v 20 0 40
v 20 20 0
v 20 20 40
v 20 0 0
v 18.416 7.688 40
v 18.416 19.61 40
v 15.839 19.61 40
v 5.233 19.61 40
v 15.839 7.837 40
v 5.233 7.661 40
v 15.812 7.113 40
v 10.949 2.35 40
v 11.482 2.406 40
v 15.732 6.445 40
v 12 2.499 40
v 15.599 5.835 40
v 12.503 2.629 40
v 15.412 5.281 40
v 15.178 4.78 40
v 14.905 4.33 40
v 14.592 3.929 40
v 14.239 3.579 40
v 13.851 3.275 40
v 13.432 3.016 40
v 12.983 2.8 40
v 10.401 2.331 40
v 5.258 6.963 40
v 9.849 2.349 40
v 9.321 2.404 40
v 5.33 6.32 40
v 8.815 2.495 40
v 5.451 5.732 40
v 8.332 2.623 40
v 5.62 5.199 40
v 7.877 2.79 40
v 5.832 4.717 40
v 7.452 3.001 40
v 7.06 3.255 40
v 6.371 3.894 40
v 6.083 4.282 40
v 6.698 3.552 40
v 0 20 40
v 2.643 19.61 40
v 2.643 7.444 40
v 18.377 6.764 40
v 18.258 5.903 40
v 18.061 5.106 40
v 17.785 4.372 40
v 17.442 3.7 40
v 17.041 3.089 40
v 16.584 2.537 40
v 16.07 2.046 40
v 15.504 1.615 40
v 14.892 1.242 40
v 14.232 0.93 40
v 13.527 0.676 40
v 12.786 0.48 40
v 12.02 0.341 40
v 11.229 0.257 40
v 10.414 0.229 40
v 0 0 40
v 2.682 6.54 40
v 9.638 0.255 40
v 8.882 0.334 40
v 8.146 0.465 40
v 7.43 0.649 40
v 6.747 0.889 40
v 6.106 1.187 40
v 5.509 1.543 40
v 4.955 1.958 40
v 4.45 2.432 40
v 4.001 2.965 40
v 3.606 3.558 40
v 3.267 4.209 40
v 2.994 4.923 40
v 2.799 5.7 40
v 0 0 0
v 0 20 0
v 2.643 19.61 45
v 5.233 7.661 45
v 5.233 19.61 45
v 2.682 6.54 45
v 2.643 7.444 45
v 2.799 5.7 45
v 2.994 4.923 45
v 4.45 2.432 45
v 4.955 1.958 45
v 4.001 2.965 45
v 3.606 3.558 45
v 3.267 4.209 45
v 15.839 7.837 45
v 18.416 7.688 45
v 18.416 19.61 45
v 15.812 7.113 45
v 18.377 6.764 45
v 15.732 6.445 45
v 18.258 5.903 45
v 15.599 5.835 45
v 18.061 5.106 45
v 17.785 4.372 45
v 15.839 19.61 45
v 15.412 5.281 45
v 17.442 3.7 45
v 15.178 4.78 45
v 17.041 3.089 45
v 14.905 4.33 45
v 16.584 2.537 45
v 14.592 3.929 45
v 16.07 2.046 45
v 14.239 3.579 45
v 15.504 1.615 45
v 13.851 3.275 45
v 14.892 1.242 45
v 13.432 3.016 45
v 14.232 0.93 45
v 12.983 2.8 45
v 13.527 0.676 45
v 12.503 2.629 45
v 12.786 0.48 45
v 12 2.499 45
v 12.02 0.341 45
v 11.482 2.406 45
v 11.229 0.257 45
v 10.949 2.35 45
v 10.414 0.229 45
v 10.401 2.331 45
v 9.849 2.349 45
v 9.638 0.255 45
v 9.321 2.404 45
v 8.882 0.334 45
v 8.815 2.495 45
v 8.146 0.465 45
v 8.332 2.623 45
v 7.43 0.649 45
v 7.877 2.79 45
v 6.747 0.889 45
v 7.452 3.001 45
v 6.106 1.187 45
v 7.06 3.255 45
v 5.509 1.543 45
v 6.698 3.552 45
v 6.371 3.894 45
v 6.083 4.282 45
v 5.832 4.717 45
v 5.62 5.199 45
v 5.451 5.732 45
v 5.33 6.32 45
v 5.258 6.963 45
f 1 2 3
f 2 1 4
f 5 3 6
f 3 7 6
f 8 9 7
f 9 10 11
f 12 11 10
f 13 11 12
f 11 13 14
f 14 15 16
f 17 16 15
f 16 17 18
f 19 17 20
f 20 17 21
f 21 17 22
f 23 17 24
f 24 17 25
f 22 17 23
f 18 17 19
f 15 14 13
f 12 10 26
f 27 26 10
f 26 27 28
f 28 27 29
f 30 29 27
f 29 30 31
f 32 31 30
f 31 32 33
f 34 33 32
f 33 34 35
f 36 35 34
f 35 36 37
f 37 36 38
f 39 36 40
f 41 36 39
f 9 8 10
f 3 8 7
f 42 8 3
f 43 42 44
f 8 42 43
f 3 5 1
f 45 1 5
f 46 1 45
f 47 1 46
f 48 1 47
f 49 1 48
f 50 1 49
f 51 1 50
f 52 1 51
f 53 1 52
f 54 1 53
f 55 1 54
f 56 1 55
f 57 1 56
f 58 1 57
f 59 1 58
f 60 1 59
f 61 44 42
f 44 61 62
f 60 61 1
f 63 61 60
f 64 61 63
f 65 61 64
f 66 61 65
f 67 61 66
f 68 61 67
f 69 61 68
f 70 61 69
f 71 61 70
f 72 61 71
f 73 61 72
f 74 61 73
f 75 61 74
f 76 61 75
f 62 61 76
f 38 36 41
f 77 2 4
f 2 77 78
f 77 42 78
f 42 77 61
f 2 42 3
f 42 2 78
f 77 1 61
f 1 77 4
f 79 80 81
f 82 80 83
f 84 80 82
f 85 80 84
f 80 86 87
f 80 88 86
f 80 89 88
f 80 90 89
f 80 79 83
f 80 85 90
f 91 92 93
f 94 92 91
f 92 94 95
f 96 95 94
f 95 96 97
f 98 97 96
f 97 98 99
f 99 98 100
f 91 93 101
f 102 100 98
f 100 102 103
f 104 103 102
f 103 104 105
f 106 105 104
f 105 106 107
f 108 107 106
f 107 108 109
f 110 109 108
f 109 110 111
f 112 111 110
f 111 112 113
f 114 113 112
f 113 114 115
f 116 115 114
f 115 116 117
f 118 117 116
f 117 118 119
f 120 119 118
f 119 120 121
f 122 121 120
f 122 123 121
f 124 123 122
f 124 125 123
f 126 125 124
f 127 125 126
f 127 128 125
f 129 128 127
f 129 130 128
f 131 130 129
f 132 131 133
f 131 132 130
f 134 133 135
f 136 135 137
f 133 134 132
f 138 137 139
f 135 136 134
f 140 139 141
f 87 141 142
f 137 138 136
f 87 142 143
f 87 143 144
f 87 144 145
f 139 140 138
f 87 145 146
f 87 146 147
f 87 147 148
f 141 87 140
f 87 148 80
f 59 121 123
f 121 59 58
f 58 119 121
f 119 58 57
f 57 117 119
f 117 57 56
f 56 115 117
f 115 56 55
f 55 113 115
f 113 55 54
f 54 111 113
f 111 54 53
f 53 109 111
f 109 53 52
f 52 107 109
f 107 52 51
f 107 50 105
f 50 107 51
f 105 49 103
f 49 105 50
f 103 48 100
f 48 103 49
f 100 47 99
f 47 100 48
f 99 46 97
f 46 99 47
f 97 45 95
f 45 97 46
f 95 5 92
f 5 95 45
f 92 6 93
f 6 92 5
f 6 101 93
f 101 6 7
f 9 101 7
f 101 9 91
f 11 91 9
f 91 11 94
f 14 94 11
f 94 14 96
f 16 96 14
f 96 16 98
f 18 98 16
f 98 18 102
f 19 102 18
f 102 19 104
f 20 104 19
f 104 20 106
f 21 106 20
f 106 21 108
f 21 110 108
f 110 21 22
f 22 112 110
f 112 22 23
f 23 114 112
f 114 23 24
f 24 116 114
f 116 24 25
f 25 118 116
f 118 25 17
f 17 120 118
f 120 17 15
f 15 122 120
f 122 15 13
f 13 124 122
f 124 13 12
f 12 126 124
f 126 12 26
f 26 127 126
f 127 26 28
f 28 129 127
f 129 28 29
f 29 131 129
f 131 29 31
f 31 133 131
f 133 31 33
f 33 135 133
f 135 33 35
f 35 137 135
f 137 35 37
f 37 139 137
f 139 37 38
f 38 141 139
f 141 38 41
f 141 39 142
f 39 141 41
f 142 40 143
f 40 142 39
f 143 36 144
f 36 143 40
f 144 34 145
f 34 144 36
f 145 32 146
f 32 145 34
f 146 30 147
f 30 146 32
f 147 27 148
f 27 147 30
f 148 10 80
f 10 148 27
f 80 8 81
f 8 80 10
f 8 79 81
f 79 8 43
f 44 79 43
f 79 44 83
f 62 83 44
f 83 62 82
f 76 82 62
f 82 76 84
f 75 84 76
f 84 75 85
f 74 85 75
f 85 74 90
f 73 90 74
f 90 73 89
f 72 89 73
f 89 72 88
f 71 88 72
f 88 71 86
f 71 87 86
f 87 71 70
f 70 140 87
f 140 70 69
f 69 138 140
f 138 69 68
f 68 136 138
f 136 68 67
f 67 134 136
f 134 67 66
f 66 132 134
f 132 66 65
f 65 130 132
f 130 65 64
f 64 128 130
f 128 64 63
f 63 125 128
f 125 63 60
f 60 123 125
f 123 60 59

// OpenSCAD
cube([20, 20, 40]);
translate([0.5, 0.5, 40]){
    linear_extrude(5){
        text("U", size=20);
    }
}
